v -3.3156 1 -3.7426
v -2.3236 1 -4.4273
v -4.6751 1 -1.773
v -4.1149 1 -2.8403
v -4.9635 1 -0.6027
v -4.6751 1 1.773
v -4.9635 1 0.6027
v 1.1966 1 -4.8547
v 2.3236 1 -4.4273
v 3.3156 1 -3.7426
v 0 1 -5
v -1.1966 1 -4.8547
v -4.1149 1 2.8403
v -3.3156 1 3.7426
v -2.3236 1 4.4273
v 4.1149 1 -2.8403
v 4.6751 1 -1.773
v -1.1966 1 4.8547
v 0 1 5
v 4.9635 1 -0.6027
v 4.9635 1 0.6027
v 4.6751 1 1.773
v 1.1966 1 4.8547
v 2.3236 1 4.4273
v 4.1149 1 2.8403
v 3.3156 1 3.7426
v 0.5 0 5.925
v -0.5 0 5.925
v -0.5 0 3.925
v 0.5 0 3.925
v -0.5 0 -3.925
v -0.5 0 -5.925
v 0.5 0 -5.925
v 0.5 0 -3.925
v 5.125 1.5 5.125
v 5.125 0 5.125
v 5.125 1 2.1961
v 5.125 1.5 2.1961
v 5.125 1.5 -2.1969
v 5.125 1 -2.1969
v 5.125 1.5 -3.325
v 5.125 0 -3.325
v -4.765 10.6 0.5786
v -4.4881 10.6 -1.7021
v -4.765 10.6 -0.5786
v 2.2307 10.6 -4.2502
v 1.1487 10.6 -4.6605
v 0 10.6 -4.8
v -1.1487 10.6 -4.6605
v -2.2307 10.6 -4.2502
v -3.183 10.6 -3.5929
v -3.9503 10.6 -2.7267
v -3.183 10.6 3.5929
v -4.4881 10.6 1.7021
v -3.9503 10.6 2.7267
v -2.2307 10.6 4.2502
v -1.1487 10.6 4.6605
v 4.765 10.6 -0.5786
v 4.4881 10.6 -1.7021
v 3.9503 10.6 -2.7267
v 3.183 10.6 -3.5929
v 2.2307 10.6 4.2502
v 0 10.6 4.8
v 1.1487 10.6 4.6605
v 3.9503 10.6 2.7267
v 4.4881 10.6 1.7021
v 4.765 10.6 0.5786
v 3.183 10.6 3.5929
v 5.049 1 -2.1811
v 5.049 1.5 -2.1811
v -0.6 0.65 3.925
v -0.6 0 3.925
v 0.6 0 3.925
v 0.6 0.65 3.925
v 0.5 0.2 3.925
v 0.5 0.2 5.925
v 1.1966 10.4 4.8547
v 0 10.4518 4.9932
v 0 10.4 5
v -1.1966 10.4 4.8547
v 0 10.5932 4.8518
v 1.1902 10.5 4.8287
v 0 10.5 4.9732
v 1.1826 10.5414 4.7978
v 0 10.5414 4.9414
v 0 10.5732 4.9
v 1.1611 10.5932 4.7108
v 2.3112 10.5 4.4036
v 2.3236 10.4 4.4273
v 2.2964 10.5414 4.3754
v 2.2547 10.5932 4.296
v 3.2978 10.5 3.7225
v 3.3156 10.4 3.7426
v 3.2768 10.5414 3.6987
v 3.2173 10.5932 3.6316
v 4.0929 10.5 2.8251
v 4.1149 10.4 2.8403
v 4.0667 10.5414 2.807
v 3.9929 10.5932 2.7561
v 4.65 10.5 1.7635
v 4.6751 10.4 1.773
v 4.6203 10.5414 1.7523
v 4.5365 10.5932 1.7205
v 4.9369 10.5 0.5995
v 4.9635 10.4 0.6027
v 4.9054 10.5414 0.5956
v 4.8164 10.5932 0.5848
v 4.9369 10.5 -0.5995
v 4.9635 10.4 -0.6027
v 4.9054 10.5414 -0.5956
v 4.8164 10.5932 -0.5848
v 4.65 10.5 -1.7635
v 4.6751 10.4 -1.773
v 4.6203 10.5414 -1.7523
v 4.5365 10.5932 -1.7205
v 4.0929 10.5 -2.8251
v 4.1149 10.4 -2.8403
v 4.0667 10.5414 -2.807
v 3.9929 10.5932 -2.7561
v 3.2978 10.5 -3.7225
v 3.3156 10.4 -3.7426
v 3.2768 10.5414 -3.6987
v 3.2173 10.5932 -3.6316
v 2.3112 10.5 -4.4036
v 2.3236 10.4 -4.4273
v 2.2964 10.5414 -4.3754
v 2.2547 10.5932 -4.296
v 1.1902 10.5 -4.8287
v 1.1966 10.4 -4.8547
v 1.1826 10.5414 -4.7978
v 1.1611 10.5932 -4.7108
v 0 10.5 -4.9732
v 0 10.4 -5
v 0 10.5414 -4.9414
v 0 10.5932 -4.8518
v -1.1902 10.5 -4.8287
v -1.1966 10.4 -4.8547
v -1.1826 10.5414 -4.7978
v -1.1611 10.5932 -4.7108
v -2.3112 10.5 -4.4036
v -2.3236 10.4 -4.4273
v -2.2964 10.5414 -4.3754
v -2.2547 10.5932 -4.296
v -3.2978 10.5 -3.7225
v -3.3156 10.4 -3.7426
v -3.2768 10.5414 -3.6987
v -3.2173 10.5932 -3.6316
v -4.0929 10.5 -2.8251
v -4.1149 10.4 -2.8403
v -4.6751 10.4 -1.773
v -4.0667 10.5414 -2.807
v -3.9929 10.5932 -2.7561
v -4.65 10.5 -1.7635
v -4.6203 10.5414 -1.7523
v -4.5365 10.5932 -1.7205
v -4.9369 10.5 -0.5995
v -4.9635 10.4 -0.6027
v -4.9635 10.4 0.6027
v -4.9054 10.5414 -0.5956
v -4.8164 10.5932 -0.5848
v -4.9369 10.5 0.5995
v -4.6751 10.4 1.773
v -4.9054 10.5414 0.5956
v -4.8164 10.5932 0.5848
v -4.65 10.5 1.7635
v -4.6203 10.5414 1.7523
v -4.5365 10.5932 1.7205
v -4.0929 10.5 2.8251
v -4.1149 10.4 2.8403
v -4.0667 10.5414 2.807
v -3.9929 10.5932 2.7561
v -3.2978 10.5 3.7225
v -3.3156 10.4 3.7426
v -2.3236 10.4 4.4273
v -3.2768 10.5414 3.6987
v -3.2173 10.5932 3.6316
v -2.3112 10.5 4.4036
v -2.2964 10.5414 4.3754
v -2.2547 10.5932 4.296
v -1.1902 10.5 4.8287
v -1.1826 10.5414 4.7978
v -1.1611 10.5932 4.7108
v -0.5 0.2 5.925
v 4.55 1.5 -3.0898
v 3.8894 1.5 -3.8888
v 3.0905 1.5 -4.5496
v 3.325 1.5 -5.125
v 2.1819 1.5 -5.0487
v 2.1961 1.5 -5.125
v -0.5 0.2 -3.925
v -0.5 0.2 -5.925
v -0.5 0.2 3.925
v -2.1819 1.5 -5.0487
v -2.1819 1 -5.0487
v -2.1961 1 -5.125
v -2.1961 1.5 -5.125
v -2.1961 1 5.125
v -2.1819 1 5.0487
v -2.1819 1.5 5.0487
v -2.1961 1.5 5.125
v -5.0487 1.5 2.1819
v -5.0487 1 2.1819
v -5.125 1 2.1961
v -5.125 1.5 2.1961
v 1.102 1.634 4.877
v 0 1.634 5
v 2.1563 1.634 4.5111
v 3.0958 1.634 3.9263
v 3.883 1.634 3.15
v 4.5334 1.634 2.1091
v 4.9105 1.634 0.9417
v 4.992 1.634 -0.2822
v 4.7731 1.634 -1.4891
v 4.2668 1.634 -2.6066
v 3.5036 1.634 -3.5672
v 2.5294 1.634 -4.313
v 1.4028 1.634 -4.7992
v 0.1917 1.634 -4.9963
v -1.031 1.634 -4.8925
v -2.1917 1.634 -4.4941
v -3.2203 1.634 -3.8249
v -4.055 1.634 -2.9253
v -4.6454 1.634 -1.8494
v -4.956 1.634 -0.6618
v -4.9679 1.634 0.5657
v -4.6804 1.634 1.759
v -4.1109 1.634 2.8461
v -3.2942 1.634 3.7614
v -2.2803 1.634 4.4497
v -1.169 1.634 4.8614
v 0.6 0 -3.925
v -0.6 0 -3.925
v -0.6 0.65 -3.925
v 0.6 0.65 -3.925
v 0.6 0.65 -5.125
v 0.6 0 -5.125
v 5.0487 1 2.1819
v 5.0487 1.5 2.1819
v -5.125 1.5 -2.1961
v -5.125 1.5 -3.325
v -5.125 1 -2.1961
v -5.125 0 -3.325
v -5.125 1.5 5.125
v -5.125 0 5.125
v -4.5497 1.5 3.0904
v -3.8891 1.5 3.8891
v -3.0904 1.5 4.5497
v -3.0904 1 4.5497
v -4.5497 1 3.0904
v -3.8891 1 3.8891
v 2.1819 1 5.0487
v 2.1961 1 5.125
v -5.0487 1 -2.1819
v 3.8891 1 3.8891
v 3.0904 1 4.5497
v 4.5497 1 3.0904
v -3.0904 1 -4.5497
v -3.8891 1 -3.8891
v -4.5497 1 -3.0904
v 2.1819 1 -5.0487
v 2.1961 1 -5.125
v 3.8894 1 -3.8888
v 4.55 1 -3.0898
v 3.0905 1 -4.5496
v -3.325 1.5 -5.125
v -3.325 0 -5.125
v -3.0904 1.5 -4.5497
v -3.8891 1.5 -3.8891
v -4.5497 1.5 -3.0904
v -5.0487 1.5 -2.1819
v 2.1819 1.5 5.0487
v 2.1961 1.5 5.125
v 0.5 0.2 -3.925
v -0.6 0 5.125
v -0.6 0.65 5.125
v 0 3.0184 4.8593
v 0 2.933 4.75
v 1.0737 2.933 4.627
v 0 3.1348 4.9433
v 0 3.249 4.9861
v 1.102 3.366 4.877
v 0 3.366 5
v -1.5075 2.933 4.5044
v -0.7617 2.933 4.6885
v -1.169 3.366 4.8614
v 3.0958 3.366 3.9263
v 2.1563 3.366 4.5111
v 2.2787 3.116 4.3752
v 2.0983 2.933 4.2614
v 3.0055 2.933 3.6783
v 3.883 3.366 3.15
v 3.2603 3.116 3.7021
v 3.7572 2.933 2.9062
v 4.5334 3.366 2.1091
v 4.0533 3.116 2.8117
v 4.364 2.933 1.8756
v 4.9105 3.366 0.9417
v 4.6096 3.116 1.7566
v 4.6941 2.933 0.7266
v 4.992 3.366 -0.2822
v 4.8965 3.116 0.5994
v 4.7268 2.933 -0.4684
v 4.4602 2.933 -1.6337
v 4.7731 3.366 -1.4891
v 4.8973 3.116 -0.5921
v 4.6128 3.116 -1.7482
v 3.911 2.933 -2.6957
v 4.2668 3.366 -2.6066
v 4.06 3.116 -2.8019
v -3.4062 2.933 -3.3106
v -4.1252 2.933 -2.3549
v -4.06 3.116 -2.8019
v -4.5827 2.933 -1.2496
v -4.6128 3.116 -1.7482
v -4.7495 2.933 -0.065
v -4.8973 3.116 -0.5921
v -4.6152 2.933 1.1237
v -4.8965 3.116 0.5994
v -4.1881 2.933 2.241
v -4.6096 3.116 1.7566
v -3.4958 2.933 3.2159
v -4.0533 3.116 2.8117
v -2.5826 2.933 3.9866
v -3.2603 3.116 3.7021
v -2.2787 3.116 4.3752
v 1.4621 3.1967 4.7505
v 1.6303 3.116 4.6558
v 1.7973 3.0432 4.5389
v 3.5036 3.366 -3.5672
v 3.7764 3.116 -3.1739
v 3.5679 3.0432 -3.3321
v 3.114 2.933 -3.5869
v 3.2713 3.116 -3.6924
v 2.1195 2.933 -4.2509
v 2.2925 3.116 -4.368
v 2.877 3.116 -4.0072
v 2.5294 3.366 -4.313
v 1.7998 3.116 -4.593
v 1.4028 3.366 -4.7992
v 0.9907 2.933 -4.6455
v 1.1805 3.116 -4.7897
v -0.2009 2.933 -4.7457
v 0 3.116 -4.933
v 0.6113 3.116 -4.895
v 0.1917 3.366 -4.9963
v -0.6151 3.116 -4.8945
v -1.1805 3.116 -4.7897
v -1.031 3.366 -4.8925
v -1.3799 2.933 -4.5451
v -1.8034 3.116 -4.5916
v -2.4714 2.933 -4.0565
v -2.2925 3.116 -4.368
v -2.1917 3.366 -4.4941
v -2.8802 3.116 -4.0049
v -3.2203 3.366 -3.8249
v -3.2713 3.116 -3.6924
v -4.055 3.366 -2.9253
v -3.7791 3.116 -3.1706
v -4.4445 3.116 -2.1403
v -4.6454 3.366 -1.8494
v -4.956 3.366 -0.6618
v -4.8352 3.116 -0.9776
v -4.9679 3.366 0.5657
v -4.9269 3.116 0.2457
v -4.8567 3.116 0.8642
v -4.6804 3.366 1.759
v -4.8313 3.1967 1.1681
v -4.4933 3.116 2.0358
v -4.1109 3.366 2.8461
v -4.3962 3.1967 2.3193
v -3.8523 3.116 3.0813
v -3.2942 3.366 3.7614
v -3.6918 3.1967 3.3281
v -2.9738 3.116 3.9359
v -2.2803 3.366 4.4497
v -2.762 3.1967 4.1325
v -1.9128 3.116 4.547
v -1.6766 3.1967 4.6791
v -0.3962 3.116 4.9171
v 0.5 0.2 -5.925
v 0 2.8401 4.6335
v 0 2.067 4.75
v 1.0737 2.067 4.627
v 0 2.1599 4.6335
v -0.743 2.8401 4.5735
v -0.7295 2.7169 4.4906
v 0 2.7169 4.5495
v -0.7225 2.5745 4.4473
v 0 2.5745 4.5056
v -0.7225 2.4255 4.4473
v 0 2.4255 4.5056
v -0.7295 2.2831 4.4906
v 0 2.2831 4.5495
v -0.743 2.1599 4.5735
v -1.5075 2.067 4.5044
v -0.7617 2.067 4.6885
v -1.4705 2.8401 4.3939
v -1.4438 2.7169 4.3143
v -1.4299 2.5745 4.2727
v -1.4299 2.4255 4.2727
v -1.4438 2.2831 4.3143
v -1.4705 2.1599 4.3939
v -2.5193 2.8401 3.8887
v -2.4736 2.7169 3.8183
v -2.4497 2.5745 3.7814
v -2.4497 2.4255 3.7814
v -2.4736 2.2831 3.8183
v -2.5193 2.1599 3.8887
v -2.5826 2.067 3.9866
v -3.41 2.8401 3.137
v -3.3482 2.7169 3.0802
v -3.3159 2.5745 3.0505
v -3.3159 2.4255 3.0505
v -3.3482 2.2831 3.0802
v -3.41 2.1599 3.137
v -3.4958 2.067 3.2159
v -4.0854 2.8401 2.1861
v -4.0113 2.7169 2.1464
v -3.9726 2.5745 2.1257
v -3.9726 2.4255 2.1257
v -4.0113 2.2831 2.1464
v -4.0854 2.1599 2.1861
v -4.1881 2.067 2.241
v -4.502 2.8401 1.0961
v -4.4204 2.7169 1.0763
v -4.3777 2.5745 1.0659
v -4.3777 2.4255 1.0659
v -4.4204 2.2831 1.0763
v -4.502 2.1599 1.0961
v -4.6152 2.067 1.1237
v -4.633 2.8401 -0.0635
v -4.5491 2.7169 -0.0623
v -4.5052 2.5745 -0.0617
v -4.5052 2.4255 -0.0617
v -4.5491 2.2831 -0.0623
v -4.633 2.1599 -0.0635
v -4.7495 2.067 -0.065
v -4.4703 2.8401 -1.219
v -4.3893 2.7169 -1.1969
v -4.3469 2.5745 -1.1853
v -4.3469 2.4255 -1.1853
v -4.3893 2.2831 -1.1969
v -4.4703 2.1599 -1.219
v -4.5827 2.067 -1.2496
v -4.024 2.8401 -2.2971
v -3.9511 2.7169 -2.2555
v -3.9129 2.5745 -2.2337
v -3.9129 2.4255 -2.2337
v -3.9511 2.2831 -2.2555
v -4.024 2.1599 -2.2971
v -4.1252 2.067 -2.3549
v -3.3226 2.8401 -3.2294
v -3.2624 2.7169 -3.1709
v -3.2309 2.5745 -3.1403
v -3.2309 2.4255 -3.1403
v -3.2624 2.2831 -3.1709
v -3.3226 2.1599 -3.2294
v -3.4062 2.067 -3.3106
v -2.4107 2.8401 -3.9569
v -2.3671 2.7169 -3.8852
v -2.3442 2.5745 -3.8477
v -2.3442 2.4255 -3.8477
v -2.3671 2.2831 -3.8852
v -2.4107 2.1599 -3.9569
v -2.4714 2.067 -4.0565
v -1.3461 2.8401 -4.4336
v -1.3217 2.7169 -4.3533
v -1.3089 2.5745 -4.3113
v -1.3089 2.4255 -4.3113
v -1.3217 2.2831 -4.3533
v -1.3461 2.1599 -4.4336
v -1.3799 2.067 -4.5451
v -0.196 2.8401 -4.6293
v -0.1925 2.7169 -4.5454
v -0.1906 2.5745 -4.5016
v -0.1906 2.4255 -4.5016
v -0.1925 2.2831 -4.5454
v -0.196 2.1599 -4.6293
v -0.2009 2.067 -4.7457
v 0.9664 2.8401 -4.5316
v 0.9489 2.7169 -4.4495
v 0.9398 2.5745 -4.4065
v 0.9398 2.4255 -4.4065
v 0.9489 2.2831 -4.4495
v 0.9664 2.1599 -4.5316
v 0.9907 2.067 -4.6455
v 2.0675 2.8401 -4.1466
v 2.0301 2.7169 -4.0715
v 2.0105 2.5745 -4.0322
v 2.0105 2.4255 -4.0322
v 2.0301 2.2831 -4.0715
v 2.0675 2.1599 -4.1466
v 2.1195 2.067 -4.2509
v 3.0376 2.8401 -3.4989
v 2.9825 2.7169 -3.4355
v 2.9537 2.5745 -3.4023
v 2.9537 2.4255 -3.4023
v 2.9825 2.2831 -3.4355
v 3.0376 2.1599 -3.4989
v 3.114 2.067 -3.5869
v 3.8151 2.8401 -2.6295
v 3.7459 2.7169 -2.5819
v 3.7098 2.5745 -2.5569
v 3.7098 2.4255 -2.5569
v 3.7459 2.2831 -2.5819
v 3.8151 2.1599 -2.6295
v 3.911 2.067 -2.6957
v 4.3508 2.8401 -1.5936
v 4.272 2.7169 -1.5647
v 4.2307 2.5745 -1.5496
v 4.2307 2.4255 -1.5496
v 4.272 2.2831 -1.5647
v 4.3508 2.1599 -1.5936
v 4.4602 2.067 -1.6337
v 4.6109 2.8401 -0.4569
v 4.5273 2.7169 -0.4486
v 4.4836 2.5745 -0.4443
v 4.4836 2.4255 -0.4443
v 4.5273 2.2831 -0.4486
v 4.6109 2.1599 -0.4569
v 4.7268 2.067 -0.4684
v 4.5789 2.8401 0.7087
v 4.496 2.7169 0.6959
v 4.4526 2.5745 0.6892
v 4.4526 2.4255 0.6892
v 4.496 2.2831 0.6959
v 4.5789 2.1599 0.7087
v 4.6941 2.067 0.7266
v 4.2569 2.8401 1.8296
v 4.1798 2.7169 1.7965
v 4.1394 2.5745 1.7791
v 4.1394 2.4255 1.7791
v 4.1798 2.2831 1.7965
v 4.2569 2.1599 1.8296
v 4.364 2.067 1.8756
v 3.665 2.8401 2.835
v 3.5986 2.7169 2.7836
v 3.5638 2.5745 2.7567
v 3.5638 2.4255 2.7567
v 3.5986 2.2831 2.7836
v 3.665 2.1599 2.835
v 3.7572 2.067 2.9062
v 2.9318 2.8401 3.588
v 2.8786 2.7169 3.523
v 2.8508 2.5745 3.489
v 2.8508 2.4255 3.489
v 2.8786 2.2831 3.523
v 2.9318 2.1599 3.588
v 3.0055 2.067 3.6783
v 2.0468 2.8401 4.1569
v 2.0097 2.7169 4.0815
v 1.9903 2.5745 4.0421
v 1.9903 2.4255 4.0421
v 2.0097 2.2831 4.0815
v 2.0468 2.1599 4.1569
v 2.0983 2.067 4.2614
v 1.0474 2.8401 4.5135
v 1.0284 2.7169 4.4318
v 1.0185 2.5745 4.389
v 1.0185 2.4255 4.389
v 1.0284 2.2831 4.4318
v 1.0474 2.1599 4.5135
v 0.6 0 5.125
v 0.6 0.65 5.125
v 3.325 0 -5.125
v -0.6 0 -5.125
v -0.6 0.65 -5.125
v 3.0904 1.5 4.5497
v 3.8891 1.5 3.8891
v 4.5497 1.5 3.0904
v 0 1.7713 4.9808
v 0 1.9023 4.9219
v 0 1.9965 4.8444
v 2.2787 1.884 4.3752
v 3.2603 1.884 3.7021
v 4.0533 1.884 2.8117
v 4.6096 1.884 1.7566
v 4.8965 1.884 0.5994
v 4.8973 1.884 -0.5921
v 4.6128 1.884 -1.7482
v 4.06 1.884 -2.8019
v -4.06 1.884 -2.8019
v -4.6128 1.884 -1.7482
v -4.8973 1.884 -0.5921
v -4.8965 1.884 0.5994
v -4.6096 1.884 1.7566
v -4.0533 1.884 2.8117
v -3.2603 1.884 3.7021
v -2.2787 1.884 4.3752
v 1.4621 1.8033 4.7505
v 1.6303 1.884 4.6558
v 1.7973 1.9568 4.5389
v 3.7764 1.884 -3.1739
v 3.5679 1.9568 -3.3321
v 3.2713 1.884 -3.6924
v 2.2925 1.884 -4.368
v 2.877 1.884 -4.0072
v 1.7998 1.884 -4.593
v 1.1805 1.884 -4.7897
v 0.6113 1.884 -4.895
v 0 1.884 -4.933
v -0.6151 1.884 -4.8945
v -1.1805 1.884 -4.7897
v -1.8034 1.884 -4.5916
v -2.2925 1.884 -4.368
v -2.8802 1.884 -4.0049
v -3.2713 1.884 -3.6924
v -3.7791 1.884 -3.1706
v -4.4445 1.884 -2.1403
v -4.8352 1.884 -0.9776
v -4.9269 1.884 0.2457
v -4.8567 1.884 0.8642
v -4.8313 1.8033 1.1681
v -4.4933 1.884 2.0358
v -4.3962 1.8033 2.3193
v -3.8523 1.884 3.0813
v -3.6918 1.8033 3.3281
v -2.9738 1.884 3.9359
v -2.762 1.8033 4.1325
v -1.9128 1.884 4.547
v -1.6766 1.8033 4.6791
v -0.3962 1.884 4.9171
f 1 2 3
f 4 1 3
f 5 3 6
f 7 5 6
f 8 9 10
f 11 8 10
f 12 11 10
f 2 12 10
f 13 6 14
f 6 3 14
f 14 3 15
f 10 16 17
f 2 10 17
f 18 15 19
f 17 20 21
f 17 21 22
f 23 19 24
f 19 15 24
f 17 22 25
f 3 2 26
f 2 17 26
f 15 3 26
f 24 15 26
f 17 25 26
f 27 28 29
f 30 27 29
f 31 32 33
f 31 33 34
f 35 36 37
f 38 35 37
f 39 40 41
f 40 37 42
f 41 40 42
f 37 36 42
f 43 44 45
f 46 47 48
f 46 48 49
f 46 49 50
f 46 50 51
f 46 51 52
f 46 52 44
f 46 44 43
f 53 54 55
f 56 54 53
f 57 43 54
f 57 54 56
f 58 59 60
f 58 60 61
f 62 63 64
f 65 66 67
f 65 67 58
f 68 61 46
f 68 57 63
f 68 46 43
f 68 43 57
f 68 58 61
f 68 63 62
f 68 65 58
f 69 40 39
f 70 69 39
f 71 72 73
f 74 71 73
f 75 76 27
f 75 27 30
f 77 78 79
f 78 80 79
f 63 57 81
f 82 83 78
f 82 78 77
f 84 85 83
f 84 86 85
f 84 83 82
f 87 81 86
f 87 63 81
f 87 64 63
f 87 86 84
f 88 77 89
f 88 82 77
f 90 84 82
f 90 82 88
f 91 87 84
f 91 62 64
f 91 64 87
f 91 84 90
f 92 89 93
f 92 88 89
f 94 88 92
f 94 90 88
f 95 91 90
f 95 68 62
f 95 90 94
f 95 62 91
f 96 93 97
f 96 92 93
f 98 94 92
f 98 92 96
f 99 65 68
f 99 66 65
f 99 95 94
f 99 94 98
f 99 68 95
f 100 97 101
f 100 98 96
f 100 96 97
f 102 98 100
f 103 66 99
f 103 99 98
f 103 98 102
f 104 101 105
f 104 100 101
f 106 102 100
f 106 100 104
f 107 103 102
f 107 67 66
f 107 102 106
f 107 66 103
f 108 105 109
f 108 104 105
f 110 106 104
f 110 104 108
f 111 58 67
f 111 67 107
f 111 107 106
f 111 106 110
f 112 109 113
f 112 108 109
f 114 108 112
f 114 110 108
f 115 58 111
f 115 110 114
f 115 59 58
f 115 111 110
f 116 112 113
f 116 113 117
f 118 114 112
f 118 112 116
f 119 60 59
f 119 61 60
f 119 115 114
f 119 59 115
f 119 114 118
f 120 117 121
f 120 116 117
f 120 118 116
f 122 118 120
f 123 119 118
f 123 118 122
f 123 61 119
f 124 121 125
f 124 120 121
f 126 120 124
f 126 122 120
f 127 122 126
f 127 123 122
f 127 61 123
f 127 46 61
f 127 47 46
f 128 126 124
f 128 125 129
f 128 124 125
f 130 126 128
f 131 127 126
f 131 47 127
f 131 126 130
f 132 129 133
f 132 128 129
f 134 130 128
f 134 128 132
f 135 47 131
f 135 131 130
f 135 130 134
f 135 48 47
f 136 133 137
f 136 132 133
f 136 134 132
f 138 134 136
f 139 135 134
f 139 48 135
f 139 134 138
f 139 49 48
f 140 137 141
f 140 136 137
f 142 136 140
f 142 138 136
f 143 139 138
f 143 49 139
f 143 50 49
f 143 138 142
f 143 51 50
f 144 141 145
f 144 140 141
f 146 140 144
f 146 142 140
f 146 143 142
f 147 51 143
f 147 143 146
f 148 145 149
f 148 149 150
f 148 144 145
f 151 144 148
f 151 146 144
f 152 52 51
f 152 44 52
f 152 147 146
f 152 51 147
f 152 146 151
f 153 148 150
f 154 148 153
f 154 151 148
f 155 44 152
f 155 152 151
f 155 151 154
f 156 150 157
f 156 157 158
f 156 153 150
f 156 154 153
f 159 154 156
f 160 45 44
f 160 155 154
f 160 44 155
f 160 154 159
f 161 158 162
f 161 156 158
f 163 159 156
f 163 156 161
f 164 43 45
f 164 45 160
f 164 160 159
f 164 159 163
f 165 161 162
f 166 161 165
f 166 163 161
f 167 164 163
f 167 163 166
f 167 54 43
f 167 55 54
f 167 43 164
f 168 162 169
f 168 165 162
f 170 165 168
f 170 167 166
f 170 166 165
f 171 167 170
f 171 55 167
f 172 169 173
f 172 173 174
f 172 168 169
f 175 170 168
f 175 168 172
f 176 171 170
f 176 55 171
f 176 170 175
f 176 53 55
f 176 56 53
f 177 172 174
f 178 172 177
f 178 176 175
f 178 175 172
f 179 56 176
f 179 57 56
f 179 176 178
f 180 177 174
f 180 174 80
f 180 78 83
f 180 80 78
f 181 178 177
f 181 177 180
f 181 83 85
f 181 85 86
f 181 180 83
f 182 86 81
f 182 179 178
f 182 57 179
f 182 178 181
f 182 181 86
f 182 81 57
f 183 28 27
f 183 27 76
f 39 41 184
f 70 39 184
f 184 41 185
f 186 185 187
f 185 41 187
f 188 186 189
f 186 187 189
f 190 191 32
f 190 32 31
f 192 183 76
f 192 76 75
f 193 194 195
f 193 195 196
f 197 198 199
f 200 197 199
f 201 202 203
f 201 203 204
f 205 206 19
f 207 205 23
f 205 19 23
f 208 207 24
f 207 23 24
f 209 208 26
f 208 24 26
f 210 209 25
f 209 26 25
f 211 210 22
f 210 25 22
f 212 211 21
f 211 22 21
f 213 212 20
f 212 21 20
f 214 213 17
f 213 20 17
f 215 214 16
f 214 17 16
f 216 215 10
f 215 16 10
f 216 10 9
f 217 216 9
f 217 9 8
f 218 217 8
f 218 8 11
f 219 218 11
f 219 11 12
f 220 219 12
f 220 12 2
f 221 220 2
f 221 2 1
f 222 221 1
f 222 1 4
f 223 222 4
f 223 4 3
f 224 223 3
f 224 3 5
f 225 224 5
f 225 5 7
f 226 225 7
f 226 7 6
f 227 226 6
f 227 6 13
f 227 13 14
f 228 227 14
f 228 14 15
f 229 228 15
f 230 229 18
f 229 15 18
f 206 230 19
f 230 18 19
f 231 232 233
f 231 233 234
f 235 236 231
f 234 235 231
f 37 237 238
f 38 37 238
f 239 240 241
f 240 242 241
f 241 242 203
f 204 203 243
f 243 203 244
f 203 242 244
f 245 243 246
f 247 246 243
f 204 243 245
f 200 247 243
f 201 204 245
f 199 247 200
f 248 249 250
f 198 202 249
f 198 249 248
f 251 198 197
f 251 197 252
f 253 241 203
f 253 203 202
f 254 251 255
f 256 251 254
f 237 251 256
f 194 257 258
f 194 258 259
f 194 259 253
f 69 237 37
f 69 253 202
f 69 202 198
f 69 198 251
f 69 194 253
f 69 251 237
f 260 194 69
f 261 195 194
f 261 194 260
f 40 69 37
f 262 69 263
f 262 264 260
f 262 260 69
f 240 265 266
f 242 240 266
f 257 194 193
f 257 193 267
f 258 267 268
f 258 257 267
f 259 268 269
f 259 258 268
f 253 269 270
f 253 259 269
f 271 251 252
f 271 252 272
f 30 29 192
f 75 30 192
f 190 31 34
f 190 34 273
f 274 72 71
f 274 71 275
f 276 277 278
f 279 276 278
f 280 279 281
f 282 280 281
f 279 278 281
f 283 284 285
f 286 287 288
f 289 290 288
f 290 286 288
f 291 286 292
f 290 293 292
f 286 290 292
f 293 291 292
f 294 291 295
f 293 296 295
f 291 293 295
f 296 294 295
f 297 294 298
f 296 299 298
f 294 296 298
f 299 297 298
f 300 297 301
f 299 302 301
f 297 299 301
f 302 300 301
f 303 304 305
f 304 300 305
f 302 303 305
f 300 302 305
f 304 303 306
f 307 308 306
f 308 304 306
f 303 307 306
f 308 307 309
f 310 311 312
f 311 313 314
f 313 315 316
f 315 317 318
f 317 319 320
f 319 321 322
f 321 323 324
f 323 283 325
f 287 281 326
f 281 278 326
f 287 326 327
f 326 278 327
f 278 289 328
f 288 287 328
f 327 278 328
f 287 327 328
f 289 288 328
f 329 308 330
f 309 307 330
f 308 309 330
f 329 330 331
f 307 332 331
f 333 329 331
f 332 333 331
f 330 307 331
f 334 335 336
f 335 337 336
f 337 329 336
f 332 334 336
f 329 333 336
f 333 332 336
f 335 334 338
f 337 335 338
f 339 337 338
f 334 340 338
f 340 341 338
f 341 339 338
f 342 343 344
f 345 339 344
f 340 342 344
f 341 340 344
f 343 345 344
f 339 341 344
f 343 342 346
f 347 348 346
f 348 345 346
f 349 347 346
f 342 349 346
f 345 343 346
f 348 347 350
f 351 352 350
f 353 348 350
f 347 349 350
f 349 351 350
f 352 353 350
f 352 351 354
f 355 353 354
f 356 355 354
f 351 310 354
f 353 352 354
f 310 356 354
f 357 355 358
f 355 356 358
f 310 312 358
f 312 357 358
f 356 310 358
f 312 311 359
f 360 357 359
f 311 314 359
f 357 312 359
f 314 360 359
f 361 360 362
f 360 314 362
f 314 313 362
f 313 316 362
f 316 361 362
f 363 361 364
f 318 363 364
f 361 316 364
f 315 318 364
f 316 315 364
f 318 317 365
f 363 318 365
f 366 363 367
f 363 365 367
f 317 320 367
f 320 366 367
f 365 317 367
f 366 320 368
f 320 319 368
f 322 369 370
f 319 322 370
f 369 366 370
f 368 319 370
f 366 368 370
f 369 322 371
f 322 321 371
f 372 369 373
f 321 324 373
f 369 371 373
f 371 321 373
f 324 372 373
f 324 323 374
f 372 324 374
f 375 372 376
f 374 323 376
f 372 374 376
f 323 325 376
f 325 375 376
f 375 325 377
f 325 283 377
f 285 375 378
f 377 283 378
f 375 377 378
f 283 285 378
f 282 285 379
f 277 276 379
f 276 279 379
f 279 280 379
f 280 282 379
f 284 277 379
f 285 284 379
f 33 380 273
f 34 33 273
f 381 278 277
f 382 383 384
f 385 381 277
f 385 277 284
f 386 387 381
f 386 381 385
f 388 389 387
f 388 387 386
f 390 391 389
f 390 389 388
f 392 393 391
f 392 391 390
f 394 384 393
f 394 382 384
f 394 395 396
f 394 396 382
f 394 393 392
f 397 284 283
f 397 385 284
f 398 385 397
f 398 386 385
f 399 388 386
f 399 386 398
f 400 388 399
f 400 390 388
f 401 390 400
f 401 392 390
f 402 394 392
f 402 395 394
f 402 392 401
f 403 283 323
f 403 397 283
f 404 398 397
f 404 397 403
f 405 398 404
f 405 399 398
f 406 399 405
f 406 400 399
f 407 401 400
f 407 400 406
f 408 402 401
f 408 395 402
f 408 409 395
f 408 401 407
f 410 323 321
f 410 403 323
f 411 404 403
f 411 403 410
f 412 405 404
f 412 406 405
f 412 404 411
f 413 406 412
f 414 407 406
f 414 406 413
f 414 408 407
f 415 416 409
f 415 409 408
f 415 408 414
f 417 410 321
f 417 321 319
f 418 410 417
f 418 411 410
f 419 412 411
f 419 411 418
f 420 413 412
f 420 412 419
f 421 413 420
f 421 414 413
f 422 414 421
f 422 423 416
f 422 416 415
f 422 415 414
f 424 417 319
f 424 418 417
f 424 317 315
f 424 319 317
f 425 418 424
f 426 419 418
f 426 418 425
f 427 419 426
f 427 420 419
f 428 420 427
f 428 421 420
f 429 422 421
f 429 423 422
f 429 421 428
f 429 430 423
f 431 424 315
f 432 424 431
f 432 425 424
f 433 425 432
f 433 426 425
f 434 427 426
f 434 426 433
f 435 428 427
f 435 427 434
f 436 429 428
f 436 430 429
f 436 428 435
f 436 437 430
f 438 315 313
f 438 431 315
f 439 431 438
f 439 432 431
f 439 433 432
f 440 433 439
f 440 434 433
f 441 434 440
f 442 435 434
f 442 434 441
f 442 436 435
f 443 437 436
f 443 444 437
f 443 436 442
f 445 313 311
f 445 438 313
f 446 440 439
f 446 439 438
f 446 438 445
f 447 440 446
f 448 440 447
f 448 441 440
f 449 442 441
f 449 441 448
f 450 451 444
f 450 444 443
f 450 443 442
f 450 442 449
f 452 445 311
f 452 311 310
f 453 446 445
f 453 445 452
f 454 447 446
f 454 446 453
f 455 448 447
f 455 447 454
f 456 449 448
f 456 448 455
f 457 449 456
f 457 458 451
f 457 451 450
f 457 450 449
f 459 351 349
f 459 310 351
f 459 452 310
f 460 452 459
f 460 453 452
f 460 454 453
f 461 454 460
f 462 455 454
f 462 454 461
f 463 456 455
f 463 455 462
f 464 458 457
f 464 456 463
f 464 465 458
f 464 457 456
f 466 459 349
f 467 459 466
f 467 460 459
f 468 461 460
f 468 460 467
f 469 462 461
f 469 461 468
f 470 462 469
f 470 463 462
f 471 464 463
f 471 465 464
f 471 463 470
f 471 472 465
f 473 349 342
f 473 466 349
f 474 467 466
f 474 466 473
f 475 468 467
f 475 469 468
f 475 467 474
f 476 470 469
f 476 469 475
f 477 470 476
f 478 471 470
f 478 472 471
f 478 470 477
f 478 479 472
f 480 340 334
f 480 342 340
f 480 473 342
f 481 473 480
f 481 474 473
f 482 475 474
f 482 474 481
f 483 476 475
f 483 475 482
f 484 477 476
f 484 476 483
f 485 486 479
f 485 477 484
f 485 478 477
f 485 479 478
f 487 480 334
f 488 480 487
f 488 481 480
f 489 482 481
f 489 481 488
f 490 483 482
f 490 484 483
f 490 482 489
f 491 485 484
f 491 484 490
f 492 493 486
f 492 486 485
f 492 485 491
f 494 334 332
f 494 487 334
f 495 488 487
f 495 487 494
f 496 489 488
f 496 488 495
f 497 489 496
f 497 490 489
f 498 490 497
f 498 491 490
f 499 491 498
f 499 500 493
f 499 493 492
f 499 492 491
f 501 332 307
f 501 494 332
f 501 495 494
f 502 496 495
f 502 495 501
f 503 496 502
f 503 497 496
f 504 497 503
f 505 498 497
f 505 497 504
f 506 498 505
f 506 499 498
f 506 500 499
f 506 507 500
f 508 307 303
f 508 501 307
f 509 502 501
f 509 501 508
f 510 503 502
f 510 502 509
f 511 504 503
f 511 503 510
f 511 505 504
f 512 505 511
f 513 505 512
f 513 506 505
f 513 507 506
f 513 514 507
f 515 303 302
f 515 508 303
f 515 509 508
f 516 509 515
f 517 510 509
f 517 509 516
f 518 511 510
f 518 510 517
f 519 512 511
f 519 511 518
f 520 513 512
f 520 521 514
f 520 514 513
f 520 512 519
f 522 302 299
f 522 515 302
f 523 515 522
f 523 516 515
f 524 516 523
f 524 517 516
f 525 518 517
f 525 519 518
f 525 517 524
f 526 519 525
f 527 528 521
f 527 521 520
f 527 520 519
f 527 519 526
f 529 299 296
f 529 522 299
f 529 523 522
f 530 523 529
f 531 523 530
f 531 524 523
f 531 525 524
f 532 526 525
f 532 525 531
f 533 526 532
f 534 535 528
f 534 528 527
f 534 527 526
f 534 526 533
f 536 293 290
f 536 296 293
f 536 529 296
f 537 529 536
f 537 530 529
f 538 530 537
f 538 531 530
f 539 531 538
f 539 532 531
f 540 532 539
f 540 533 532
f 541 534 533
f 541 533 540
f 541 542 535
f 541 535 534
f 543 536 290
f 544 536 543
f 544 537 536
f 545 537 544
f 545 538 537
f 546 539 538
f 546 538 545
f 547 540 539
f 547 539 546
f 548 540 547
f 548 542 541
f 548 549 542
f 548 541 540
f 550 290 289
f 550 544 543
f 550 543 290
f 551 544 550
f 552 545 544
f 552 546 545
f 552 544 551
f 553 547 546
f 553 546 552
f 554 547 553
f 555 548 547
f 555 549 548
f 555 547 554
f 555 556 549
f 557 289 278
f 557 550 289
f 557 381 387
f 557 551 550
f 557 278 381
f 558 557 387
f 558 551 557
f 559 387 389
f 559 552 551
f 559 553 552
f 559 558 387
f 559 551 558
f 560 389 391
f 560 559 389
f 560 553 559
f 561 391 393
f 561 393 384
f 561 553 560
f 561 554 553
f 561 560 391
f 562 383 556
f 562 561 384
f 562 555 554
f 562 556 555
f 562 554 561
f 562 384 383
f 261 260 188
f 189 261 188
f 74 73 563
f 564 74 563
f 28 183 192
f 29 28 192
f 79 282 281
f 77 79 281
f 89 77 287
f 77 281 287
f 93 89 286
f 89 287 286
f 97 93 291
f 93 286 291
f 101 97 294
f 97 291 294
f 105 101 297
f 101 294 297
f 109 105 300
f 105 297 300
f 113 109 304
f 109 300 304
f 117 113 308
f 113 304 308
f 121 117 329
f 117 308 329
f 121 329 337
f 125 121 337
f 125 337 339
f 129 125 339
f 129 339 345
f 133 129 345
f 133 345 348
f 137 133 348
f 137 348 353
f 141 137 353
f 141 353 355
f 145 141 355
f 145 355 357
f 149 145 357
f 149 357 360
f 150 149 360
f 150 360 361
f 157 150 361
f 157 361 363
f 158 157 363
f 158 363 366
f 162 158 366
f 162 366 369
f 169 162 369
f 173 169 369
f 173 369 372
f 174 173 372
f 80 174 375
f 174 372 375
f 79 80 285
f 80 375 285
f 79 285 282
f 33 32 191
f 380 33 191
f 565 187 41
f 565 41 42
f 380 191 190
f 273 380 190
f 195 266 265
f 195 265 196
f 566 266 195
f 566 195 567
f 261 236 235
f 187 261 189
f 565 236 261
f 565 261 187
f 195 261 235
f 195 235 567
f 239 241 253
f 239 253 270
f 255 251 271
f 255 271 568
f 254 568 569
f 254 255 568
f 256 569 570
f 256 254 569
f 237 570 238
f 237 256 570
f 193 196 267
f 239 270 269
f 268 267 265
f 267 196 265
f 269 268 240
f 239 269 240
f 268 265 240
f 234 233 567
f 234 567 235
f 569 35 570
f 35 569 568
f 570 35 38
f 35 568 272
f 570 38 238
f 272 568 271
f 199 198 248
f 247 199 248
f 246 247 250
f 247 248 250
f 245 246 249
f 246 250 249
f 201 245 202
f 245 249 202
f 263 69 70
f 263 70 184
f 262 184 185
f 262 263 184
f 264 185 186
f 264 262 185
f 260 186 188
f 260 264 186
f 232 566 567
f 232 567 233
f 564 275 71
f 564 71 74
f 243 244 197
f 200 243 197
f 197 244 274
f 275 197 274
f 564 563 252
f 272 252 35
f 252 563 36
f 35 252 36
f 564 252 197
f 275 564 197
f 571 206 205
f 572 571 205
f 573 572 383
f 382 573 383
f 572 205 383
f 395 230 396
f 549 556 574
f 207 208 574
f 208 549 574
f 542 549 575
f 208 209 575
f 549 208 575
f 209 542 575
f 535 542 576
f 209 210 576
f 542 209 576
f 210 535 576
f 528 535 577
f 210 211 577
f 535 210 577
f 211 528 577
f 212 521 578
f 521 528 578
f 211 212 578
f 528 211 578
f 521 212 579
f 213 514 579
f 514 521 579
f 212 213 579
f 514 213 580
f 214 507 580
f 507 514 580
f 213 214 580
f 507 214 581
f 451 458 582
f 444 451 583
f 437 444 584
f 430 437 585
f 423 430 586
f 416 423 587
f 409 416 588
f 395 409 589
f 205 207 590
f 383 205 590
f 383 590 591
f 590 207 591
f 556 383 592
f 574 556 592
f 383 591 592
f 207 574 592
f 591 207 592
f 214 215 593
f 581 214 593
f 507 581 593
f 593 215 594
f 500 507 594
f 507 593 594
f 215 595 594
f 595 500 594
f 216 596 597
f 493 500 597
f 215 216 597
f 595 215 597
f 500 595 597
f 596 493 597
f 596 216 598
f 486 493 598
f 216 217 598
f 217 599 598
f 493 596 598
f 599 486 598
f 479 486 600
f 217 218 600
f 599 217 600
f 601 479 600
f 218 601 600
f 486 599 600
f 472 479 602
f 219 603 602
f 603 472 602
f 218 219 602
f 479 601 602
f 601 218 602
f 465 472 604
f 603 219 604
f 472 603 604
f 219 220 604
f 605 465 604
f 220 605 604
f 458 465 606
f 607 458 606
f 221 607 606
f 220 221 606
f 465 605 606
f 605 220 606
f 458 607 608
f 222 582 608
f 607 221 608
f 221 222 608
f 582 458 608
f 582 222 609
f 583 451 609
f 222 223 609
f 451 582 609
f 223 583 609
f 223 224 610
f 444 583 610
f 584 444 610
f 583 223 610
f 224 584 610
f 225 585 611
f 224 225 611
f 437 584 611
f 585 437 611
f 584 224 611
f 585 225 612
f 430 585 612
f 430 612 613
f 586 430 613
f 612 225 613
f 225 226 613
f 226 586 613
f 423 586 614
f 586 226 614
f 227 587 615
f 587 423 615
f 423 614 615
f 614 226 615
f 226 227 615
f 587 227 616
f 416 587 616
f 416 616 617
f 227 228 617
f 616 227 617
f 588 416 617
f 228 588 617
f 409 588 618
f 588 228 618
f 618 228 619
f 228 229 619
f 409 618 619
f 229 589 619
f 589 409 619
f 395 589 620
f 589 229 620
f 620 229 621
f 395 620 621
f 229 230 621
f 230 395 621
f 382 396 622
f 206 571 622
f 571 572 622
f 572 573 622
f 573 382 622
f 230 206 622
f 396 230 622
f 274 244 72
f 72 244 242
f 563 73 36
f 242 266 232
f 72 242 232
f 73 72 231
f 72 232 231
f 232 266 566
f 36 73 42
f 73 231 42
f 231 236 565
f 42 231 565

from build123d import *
from OCP.BRepFilletAPI import BRepFilletAPI_MakeChamfer

# Parameters (mm, degrees)
SKETCH1_W                = 10.25
SKETCH1_H                = 10.25
BOSS_EXTRUDE1_DEPTH      = 1
SKETCH2_R                = 5
BOSS_EXTRUDE2_DEPTH      = 9.6
BOSS_EXTRUDE3_DEPTH      = 0.5
SKETCH3_R                = 0.5
FILLET1_R                = 0.5
FILLET2_R                = 0.2
CHAMFER1_SIZE            = 1.8
SKETCH4_W                = 1.2
SKETCH4_H                = 1.2
CUT_EXTRUDE1_DEPTH       = 0.65
EXTRUDE_THIN1_DEPTH      = 0.5
EXTRUDE_THIN1_DEPTH_BACK = 0.5
SKETCH6_W                = 2
SKETCH6_H                = 0.2
CHAMFER2_SIZE            = 0.200841177
CHAMFER2_SIZE2           = 0.2
CHAMFER2_SIZE_2          = 0.2
CHAMFER2_SIZE2_2         = 0.200841177


with BuildPart() as part:
    # Sketch1 → Boss-Extrude1 (new body)
    with BuildSketch(Plane(origin=(0, 0, 0), x_dir=(1, 0, 0), z_dir=(0, 1, 0))):
        Rectangle(SKETCH1_W, SKETCH1_H)
    extrude(amount=BOSS_EXTRUDE1_DEPTH)

    # Sketch5 → Boss-Extrude3 (add)
    with BuildSketch(Plane(origin=(0, 1, 0), x_dir=(1, 0, 0), z_dir=(0, 1, 0))):
        with BuildLine():
            Line((-5.125, -1.996089928), (-5.125, -5.125))
            Line((-5.125, -5.125), (-1.996089928, -5.125))
            ThreePointArc((-1.996089928, -5.125), (-3.889087297, -3.889087297), (-5.125, -1.996089928))
        make_face()
        with BuildLine():
            Line((-5.125, 5.125), (-1.996089928, 5.125))
            ThreePointArc((-1.996089928, 5.125), (-3.889087297, 3.889087297), (-5.125, 1.996089928))
            Line((-5.125, 1.996089928), (-5.125, 5.125))
        make_face()
        with BuildLine():
            Line((5.125, 5.125), (5.125, 1.996089928))
            ThreePointArc((5.125, 1.996089928), (3.889087297, 3.889087297), (1.996089928, 5.125))
            Line((1.996089928, 5.125), (5.125, 5.125))
        make_face()
        with BuildLine():
            Line((5.125, -1.996089928), (5.125, -5.125))
            Line((5.125, -5.125), (1.996089928, -5.125))
            ThreePointArc((1.996089928, -5.125), (3.889087297, -3.889087297), (5.125, -1.996089928))
        make_face()
    extrude(amount=BOSS_EXTRUDE3_DEPTH)

    # Chamfer1
    chamfer1_edges = [part.edges().sort_by_distance(p)[0] for p in [
        (-5.125, 0.75, -5.125),
        (5.125, 0.75, -5.125),
    ]]
    chamfer(chamfer1_edges, length=CHAMFER1_SIZE)

    # Sketch4 → Cut-Extrude1 (cut)
    with BuildSketch(Plane.XZ):
        with Locations((0, 4.525)):
            Rectangle(SKETCH4_W, SKETCH4_H)
        with Locations((0, -4.525)):
            Rectangle(SKETCH4_W, SKETCH4_H)
    extrude(amount=-CUT_EXTRUDE1_DEPTH, mode=Mode.SUBTRACT)

    # Chamfer2: one chamfer whose edges measure the first distance from different faces: ONE call of the kernel's chamfer builder (chamfer() names one face for all edges)
    chamfer2_edges_1 = [part.edges().sort_by_distance(p)[0] for p in [
        (-5.125, 1.25, -1.996089928),
    ]]
    chamfer2_side_1 = [part.faces().sort_by_distance(p)[0] for p in [
        (-3.889087297, 1.25, -3.889087297),
    ]]
    chamfer2_edges_2 = [part.edges().sort_by_distance(p)[0] for p in [
        (-1.996089928, 1.25, -5.125),
        (1.996089928, 1.25, -5.125),
    ]]
    chamfer2_side_2 = [part.faces().sort_by_distance(p)[0] for p in [
        (0, 0.657410294, -5.125),
    ]]
    chamfer2_edges_3 = [part.edges().sort_by_distance(p)[0] for p in [
        (1.996089928, 1.25, 5.125),
        (-1.996089928, 1.25, 5.125),
    ]]
    chamfer2_side_3 = [part.faces().sort_by_distance(p)[0] for p in [
        (0, 0.69709503, 5.125),
    ]]
    chamfer2_edges_4 = [part.edges().sort_by_distance(p)[0] for p in [
        (5.125, 1.25, 1.996089928),
    ]]
    chamfer2_side_4 = [part.faces().sort_by_distance(p)[0] for p in [
        (5.125, 0.656540559, 1.068226993),
    ]]
    chamfer2_edges_5 = [part.edges().sort_by_distance(p)[0] for p in [
        (-5.125, 1.25, 1.996089928),
    ]]
    chamfer2_side_5 = [part.faces().sort_by_distance(p)[0] for p in [
        (-5.125, 0.656540559, 1.068226993),
    ]]
    chamfer2_edges_6 = [part.edges().sort_by_distance(p)[0] for p in [
        (5.125, 1.25, -1.996089928),
    ]]
    chamfer2_side_6 = [part.faces().sort_by_distance(p)[0] for p in [
        (3.889087297, 1.25, -3.889087297),
    ]]
    chamfer2 = BRepFilletAPI_MakeChamfer(part.part.solid().wrapped)
    for e in chamfer2_edges_1:
        chamfer2.Add(CHAMFER2_SIZE, CHAMFER2_SIZE2, e.wrapped, chamfer2_side_1[0].wrapped)  # the first distance lies on this face
    for e in chamfer2_edges_2:
        chamfer2.Add(CHAMFER2_SIZE_2, CHAMFER2_SIZE2_2, e.wrapped, chamfer2_side_2[0].wrapped)  # the first distance lies on this face
    for e in chamfer2_edges_3:
        chamfer2.Add(CHAMFER2_SIZE_2, CHAMFER2_SIZE2_2, e.wrapped, chamfer2_side_3[0].wrapped)  # the first distance lies on this face
    for e in chamfer2_edges_4:
        chamfer2.Add(CHAMFER2_SIZE_2, CHAMFER2_SIZE2_2, e.wrapped, chamfer2_side_4[0].wrapped)  # the first distance lies on this face
    for e in chamfer2_edges_5:
        chamfer2.Add(CHAMFER2_SIZE_2, CHAMFER2_SIZE2_2, e.wrapped, chamfer2_side_5[0].wrapped)  # the first distance lies on this face
    for e in chamfer2_edges_6:
        chamfer2.Add(CHAMFER2_SIZE_2, CHAMFER2_SIZE2_2, e.wrapped, chamfer2_side_6[0].wrapped)  # the first distance lies on this face
    add(Compound.cast(chamfer2.Shape()), mode=Mode.REPLACE)


with BuildPart() as body_2:
    # Sketch2 → Boss-Extrude2 (new body)
    with BuildSketch(Plane(origin=(0, 1, 0), x_dir=(1, 0, 0), z_dir=(0, 1, 0))):
        with Locations(Location((0, 0, 0), (0, 0, 270))):
            Circle(SKETCH2_R)
    extrude(amount=BOSS_EXTRUDE2_DEPTH)

    # Sketch3 → Cut-Revolve1 (revolve, cut)
    with BuildSketch(Plane.XY, mode=Mode.PRIVATE) as cut_revolve1_sk:
        with Locations((5, 2.5)):
            Circle(SKETCH3_R)
    revolve(cut_revolve1_sk.sketch.rotate(Axis((0, 10.6, 0), (0, -1, 0)), 90), axis=Axis((0, 10.6, 0), (0, -1, 0)), mode=Mode.SUBTRACT)

    # Fillet1
    fillet1_edges = [body_2.edges().sort_by_distance(p)[0] for p in [
        (0, 3, -5),
        (0, 2, -5),
    ]]
    fillet(fillet1_edges, radius=FILLET1_R)

    # Fillet2
    fillet2_edges = [body_2.edges().sort_by_distance(p)[0] for p in [
        (0, 10.6, -5),
    ]]
    fillet(fillet2_edges, radius=FILLET2_R)


with BuildPart() as body_3:
    # Sketch6 → Extrude-Thin1 (new, two sides: drawn at the far end of the back side and taken through both)
    with BuildSketch(Plane(origin=(0, 0, 0), x_dir=(0, 0, -1), z_dir=(1, 0, 0)).offset(-EXTRUDE_THIN1_DEPTH_BACK)):
        with Locations((-4.925, 0.1)):
            Rectangle(SKETCH6_W, SKETCH6_H)
    extrude(amount=EXTRUDE_THIN1_DEPTH + EXTRUDE_THIN1_DEPTH_BACK)


with BuildPart() as body_4:
    # Mirror3: mirrored copy
    add(body_3.part.mirror(Plane.XY))


solid = Compound([part.part, body_2.part, body_3.part, body_4.part])
